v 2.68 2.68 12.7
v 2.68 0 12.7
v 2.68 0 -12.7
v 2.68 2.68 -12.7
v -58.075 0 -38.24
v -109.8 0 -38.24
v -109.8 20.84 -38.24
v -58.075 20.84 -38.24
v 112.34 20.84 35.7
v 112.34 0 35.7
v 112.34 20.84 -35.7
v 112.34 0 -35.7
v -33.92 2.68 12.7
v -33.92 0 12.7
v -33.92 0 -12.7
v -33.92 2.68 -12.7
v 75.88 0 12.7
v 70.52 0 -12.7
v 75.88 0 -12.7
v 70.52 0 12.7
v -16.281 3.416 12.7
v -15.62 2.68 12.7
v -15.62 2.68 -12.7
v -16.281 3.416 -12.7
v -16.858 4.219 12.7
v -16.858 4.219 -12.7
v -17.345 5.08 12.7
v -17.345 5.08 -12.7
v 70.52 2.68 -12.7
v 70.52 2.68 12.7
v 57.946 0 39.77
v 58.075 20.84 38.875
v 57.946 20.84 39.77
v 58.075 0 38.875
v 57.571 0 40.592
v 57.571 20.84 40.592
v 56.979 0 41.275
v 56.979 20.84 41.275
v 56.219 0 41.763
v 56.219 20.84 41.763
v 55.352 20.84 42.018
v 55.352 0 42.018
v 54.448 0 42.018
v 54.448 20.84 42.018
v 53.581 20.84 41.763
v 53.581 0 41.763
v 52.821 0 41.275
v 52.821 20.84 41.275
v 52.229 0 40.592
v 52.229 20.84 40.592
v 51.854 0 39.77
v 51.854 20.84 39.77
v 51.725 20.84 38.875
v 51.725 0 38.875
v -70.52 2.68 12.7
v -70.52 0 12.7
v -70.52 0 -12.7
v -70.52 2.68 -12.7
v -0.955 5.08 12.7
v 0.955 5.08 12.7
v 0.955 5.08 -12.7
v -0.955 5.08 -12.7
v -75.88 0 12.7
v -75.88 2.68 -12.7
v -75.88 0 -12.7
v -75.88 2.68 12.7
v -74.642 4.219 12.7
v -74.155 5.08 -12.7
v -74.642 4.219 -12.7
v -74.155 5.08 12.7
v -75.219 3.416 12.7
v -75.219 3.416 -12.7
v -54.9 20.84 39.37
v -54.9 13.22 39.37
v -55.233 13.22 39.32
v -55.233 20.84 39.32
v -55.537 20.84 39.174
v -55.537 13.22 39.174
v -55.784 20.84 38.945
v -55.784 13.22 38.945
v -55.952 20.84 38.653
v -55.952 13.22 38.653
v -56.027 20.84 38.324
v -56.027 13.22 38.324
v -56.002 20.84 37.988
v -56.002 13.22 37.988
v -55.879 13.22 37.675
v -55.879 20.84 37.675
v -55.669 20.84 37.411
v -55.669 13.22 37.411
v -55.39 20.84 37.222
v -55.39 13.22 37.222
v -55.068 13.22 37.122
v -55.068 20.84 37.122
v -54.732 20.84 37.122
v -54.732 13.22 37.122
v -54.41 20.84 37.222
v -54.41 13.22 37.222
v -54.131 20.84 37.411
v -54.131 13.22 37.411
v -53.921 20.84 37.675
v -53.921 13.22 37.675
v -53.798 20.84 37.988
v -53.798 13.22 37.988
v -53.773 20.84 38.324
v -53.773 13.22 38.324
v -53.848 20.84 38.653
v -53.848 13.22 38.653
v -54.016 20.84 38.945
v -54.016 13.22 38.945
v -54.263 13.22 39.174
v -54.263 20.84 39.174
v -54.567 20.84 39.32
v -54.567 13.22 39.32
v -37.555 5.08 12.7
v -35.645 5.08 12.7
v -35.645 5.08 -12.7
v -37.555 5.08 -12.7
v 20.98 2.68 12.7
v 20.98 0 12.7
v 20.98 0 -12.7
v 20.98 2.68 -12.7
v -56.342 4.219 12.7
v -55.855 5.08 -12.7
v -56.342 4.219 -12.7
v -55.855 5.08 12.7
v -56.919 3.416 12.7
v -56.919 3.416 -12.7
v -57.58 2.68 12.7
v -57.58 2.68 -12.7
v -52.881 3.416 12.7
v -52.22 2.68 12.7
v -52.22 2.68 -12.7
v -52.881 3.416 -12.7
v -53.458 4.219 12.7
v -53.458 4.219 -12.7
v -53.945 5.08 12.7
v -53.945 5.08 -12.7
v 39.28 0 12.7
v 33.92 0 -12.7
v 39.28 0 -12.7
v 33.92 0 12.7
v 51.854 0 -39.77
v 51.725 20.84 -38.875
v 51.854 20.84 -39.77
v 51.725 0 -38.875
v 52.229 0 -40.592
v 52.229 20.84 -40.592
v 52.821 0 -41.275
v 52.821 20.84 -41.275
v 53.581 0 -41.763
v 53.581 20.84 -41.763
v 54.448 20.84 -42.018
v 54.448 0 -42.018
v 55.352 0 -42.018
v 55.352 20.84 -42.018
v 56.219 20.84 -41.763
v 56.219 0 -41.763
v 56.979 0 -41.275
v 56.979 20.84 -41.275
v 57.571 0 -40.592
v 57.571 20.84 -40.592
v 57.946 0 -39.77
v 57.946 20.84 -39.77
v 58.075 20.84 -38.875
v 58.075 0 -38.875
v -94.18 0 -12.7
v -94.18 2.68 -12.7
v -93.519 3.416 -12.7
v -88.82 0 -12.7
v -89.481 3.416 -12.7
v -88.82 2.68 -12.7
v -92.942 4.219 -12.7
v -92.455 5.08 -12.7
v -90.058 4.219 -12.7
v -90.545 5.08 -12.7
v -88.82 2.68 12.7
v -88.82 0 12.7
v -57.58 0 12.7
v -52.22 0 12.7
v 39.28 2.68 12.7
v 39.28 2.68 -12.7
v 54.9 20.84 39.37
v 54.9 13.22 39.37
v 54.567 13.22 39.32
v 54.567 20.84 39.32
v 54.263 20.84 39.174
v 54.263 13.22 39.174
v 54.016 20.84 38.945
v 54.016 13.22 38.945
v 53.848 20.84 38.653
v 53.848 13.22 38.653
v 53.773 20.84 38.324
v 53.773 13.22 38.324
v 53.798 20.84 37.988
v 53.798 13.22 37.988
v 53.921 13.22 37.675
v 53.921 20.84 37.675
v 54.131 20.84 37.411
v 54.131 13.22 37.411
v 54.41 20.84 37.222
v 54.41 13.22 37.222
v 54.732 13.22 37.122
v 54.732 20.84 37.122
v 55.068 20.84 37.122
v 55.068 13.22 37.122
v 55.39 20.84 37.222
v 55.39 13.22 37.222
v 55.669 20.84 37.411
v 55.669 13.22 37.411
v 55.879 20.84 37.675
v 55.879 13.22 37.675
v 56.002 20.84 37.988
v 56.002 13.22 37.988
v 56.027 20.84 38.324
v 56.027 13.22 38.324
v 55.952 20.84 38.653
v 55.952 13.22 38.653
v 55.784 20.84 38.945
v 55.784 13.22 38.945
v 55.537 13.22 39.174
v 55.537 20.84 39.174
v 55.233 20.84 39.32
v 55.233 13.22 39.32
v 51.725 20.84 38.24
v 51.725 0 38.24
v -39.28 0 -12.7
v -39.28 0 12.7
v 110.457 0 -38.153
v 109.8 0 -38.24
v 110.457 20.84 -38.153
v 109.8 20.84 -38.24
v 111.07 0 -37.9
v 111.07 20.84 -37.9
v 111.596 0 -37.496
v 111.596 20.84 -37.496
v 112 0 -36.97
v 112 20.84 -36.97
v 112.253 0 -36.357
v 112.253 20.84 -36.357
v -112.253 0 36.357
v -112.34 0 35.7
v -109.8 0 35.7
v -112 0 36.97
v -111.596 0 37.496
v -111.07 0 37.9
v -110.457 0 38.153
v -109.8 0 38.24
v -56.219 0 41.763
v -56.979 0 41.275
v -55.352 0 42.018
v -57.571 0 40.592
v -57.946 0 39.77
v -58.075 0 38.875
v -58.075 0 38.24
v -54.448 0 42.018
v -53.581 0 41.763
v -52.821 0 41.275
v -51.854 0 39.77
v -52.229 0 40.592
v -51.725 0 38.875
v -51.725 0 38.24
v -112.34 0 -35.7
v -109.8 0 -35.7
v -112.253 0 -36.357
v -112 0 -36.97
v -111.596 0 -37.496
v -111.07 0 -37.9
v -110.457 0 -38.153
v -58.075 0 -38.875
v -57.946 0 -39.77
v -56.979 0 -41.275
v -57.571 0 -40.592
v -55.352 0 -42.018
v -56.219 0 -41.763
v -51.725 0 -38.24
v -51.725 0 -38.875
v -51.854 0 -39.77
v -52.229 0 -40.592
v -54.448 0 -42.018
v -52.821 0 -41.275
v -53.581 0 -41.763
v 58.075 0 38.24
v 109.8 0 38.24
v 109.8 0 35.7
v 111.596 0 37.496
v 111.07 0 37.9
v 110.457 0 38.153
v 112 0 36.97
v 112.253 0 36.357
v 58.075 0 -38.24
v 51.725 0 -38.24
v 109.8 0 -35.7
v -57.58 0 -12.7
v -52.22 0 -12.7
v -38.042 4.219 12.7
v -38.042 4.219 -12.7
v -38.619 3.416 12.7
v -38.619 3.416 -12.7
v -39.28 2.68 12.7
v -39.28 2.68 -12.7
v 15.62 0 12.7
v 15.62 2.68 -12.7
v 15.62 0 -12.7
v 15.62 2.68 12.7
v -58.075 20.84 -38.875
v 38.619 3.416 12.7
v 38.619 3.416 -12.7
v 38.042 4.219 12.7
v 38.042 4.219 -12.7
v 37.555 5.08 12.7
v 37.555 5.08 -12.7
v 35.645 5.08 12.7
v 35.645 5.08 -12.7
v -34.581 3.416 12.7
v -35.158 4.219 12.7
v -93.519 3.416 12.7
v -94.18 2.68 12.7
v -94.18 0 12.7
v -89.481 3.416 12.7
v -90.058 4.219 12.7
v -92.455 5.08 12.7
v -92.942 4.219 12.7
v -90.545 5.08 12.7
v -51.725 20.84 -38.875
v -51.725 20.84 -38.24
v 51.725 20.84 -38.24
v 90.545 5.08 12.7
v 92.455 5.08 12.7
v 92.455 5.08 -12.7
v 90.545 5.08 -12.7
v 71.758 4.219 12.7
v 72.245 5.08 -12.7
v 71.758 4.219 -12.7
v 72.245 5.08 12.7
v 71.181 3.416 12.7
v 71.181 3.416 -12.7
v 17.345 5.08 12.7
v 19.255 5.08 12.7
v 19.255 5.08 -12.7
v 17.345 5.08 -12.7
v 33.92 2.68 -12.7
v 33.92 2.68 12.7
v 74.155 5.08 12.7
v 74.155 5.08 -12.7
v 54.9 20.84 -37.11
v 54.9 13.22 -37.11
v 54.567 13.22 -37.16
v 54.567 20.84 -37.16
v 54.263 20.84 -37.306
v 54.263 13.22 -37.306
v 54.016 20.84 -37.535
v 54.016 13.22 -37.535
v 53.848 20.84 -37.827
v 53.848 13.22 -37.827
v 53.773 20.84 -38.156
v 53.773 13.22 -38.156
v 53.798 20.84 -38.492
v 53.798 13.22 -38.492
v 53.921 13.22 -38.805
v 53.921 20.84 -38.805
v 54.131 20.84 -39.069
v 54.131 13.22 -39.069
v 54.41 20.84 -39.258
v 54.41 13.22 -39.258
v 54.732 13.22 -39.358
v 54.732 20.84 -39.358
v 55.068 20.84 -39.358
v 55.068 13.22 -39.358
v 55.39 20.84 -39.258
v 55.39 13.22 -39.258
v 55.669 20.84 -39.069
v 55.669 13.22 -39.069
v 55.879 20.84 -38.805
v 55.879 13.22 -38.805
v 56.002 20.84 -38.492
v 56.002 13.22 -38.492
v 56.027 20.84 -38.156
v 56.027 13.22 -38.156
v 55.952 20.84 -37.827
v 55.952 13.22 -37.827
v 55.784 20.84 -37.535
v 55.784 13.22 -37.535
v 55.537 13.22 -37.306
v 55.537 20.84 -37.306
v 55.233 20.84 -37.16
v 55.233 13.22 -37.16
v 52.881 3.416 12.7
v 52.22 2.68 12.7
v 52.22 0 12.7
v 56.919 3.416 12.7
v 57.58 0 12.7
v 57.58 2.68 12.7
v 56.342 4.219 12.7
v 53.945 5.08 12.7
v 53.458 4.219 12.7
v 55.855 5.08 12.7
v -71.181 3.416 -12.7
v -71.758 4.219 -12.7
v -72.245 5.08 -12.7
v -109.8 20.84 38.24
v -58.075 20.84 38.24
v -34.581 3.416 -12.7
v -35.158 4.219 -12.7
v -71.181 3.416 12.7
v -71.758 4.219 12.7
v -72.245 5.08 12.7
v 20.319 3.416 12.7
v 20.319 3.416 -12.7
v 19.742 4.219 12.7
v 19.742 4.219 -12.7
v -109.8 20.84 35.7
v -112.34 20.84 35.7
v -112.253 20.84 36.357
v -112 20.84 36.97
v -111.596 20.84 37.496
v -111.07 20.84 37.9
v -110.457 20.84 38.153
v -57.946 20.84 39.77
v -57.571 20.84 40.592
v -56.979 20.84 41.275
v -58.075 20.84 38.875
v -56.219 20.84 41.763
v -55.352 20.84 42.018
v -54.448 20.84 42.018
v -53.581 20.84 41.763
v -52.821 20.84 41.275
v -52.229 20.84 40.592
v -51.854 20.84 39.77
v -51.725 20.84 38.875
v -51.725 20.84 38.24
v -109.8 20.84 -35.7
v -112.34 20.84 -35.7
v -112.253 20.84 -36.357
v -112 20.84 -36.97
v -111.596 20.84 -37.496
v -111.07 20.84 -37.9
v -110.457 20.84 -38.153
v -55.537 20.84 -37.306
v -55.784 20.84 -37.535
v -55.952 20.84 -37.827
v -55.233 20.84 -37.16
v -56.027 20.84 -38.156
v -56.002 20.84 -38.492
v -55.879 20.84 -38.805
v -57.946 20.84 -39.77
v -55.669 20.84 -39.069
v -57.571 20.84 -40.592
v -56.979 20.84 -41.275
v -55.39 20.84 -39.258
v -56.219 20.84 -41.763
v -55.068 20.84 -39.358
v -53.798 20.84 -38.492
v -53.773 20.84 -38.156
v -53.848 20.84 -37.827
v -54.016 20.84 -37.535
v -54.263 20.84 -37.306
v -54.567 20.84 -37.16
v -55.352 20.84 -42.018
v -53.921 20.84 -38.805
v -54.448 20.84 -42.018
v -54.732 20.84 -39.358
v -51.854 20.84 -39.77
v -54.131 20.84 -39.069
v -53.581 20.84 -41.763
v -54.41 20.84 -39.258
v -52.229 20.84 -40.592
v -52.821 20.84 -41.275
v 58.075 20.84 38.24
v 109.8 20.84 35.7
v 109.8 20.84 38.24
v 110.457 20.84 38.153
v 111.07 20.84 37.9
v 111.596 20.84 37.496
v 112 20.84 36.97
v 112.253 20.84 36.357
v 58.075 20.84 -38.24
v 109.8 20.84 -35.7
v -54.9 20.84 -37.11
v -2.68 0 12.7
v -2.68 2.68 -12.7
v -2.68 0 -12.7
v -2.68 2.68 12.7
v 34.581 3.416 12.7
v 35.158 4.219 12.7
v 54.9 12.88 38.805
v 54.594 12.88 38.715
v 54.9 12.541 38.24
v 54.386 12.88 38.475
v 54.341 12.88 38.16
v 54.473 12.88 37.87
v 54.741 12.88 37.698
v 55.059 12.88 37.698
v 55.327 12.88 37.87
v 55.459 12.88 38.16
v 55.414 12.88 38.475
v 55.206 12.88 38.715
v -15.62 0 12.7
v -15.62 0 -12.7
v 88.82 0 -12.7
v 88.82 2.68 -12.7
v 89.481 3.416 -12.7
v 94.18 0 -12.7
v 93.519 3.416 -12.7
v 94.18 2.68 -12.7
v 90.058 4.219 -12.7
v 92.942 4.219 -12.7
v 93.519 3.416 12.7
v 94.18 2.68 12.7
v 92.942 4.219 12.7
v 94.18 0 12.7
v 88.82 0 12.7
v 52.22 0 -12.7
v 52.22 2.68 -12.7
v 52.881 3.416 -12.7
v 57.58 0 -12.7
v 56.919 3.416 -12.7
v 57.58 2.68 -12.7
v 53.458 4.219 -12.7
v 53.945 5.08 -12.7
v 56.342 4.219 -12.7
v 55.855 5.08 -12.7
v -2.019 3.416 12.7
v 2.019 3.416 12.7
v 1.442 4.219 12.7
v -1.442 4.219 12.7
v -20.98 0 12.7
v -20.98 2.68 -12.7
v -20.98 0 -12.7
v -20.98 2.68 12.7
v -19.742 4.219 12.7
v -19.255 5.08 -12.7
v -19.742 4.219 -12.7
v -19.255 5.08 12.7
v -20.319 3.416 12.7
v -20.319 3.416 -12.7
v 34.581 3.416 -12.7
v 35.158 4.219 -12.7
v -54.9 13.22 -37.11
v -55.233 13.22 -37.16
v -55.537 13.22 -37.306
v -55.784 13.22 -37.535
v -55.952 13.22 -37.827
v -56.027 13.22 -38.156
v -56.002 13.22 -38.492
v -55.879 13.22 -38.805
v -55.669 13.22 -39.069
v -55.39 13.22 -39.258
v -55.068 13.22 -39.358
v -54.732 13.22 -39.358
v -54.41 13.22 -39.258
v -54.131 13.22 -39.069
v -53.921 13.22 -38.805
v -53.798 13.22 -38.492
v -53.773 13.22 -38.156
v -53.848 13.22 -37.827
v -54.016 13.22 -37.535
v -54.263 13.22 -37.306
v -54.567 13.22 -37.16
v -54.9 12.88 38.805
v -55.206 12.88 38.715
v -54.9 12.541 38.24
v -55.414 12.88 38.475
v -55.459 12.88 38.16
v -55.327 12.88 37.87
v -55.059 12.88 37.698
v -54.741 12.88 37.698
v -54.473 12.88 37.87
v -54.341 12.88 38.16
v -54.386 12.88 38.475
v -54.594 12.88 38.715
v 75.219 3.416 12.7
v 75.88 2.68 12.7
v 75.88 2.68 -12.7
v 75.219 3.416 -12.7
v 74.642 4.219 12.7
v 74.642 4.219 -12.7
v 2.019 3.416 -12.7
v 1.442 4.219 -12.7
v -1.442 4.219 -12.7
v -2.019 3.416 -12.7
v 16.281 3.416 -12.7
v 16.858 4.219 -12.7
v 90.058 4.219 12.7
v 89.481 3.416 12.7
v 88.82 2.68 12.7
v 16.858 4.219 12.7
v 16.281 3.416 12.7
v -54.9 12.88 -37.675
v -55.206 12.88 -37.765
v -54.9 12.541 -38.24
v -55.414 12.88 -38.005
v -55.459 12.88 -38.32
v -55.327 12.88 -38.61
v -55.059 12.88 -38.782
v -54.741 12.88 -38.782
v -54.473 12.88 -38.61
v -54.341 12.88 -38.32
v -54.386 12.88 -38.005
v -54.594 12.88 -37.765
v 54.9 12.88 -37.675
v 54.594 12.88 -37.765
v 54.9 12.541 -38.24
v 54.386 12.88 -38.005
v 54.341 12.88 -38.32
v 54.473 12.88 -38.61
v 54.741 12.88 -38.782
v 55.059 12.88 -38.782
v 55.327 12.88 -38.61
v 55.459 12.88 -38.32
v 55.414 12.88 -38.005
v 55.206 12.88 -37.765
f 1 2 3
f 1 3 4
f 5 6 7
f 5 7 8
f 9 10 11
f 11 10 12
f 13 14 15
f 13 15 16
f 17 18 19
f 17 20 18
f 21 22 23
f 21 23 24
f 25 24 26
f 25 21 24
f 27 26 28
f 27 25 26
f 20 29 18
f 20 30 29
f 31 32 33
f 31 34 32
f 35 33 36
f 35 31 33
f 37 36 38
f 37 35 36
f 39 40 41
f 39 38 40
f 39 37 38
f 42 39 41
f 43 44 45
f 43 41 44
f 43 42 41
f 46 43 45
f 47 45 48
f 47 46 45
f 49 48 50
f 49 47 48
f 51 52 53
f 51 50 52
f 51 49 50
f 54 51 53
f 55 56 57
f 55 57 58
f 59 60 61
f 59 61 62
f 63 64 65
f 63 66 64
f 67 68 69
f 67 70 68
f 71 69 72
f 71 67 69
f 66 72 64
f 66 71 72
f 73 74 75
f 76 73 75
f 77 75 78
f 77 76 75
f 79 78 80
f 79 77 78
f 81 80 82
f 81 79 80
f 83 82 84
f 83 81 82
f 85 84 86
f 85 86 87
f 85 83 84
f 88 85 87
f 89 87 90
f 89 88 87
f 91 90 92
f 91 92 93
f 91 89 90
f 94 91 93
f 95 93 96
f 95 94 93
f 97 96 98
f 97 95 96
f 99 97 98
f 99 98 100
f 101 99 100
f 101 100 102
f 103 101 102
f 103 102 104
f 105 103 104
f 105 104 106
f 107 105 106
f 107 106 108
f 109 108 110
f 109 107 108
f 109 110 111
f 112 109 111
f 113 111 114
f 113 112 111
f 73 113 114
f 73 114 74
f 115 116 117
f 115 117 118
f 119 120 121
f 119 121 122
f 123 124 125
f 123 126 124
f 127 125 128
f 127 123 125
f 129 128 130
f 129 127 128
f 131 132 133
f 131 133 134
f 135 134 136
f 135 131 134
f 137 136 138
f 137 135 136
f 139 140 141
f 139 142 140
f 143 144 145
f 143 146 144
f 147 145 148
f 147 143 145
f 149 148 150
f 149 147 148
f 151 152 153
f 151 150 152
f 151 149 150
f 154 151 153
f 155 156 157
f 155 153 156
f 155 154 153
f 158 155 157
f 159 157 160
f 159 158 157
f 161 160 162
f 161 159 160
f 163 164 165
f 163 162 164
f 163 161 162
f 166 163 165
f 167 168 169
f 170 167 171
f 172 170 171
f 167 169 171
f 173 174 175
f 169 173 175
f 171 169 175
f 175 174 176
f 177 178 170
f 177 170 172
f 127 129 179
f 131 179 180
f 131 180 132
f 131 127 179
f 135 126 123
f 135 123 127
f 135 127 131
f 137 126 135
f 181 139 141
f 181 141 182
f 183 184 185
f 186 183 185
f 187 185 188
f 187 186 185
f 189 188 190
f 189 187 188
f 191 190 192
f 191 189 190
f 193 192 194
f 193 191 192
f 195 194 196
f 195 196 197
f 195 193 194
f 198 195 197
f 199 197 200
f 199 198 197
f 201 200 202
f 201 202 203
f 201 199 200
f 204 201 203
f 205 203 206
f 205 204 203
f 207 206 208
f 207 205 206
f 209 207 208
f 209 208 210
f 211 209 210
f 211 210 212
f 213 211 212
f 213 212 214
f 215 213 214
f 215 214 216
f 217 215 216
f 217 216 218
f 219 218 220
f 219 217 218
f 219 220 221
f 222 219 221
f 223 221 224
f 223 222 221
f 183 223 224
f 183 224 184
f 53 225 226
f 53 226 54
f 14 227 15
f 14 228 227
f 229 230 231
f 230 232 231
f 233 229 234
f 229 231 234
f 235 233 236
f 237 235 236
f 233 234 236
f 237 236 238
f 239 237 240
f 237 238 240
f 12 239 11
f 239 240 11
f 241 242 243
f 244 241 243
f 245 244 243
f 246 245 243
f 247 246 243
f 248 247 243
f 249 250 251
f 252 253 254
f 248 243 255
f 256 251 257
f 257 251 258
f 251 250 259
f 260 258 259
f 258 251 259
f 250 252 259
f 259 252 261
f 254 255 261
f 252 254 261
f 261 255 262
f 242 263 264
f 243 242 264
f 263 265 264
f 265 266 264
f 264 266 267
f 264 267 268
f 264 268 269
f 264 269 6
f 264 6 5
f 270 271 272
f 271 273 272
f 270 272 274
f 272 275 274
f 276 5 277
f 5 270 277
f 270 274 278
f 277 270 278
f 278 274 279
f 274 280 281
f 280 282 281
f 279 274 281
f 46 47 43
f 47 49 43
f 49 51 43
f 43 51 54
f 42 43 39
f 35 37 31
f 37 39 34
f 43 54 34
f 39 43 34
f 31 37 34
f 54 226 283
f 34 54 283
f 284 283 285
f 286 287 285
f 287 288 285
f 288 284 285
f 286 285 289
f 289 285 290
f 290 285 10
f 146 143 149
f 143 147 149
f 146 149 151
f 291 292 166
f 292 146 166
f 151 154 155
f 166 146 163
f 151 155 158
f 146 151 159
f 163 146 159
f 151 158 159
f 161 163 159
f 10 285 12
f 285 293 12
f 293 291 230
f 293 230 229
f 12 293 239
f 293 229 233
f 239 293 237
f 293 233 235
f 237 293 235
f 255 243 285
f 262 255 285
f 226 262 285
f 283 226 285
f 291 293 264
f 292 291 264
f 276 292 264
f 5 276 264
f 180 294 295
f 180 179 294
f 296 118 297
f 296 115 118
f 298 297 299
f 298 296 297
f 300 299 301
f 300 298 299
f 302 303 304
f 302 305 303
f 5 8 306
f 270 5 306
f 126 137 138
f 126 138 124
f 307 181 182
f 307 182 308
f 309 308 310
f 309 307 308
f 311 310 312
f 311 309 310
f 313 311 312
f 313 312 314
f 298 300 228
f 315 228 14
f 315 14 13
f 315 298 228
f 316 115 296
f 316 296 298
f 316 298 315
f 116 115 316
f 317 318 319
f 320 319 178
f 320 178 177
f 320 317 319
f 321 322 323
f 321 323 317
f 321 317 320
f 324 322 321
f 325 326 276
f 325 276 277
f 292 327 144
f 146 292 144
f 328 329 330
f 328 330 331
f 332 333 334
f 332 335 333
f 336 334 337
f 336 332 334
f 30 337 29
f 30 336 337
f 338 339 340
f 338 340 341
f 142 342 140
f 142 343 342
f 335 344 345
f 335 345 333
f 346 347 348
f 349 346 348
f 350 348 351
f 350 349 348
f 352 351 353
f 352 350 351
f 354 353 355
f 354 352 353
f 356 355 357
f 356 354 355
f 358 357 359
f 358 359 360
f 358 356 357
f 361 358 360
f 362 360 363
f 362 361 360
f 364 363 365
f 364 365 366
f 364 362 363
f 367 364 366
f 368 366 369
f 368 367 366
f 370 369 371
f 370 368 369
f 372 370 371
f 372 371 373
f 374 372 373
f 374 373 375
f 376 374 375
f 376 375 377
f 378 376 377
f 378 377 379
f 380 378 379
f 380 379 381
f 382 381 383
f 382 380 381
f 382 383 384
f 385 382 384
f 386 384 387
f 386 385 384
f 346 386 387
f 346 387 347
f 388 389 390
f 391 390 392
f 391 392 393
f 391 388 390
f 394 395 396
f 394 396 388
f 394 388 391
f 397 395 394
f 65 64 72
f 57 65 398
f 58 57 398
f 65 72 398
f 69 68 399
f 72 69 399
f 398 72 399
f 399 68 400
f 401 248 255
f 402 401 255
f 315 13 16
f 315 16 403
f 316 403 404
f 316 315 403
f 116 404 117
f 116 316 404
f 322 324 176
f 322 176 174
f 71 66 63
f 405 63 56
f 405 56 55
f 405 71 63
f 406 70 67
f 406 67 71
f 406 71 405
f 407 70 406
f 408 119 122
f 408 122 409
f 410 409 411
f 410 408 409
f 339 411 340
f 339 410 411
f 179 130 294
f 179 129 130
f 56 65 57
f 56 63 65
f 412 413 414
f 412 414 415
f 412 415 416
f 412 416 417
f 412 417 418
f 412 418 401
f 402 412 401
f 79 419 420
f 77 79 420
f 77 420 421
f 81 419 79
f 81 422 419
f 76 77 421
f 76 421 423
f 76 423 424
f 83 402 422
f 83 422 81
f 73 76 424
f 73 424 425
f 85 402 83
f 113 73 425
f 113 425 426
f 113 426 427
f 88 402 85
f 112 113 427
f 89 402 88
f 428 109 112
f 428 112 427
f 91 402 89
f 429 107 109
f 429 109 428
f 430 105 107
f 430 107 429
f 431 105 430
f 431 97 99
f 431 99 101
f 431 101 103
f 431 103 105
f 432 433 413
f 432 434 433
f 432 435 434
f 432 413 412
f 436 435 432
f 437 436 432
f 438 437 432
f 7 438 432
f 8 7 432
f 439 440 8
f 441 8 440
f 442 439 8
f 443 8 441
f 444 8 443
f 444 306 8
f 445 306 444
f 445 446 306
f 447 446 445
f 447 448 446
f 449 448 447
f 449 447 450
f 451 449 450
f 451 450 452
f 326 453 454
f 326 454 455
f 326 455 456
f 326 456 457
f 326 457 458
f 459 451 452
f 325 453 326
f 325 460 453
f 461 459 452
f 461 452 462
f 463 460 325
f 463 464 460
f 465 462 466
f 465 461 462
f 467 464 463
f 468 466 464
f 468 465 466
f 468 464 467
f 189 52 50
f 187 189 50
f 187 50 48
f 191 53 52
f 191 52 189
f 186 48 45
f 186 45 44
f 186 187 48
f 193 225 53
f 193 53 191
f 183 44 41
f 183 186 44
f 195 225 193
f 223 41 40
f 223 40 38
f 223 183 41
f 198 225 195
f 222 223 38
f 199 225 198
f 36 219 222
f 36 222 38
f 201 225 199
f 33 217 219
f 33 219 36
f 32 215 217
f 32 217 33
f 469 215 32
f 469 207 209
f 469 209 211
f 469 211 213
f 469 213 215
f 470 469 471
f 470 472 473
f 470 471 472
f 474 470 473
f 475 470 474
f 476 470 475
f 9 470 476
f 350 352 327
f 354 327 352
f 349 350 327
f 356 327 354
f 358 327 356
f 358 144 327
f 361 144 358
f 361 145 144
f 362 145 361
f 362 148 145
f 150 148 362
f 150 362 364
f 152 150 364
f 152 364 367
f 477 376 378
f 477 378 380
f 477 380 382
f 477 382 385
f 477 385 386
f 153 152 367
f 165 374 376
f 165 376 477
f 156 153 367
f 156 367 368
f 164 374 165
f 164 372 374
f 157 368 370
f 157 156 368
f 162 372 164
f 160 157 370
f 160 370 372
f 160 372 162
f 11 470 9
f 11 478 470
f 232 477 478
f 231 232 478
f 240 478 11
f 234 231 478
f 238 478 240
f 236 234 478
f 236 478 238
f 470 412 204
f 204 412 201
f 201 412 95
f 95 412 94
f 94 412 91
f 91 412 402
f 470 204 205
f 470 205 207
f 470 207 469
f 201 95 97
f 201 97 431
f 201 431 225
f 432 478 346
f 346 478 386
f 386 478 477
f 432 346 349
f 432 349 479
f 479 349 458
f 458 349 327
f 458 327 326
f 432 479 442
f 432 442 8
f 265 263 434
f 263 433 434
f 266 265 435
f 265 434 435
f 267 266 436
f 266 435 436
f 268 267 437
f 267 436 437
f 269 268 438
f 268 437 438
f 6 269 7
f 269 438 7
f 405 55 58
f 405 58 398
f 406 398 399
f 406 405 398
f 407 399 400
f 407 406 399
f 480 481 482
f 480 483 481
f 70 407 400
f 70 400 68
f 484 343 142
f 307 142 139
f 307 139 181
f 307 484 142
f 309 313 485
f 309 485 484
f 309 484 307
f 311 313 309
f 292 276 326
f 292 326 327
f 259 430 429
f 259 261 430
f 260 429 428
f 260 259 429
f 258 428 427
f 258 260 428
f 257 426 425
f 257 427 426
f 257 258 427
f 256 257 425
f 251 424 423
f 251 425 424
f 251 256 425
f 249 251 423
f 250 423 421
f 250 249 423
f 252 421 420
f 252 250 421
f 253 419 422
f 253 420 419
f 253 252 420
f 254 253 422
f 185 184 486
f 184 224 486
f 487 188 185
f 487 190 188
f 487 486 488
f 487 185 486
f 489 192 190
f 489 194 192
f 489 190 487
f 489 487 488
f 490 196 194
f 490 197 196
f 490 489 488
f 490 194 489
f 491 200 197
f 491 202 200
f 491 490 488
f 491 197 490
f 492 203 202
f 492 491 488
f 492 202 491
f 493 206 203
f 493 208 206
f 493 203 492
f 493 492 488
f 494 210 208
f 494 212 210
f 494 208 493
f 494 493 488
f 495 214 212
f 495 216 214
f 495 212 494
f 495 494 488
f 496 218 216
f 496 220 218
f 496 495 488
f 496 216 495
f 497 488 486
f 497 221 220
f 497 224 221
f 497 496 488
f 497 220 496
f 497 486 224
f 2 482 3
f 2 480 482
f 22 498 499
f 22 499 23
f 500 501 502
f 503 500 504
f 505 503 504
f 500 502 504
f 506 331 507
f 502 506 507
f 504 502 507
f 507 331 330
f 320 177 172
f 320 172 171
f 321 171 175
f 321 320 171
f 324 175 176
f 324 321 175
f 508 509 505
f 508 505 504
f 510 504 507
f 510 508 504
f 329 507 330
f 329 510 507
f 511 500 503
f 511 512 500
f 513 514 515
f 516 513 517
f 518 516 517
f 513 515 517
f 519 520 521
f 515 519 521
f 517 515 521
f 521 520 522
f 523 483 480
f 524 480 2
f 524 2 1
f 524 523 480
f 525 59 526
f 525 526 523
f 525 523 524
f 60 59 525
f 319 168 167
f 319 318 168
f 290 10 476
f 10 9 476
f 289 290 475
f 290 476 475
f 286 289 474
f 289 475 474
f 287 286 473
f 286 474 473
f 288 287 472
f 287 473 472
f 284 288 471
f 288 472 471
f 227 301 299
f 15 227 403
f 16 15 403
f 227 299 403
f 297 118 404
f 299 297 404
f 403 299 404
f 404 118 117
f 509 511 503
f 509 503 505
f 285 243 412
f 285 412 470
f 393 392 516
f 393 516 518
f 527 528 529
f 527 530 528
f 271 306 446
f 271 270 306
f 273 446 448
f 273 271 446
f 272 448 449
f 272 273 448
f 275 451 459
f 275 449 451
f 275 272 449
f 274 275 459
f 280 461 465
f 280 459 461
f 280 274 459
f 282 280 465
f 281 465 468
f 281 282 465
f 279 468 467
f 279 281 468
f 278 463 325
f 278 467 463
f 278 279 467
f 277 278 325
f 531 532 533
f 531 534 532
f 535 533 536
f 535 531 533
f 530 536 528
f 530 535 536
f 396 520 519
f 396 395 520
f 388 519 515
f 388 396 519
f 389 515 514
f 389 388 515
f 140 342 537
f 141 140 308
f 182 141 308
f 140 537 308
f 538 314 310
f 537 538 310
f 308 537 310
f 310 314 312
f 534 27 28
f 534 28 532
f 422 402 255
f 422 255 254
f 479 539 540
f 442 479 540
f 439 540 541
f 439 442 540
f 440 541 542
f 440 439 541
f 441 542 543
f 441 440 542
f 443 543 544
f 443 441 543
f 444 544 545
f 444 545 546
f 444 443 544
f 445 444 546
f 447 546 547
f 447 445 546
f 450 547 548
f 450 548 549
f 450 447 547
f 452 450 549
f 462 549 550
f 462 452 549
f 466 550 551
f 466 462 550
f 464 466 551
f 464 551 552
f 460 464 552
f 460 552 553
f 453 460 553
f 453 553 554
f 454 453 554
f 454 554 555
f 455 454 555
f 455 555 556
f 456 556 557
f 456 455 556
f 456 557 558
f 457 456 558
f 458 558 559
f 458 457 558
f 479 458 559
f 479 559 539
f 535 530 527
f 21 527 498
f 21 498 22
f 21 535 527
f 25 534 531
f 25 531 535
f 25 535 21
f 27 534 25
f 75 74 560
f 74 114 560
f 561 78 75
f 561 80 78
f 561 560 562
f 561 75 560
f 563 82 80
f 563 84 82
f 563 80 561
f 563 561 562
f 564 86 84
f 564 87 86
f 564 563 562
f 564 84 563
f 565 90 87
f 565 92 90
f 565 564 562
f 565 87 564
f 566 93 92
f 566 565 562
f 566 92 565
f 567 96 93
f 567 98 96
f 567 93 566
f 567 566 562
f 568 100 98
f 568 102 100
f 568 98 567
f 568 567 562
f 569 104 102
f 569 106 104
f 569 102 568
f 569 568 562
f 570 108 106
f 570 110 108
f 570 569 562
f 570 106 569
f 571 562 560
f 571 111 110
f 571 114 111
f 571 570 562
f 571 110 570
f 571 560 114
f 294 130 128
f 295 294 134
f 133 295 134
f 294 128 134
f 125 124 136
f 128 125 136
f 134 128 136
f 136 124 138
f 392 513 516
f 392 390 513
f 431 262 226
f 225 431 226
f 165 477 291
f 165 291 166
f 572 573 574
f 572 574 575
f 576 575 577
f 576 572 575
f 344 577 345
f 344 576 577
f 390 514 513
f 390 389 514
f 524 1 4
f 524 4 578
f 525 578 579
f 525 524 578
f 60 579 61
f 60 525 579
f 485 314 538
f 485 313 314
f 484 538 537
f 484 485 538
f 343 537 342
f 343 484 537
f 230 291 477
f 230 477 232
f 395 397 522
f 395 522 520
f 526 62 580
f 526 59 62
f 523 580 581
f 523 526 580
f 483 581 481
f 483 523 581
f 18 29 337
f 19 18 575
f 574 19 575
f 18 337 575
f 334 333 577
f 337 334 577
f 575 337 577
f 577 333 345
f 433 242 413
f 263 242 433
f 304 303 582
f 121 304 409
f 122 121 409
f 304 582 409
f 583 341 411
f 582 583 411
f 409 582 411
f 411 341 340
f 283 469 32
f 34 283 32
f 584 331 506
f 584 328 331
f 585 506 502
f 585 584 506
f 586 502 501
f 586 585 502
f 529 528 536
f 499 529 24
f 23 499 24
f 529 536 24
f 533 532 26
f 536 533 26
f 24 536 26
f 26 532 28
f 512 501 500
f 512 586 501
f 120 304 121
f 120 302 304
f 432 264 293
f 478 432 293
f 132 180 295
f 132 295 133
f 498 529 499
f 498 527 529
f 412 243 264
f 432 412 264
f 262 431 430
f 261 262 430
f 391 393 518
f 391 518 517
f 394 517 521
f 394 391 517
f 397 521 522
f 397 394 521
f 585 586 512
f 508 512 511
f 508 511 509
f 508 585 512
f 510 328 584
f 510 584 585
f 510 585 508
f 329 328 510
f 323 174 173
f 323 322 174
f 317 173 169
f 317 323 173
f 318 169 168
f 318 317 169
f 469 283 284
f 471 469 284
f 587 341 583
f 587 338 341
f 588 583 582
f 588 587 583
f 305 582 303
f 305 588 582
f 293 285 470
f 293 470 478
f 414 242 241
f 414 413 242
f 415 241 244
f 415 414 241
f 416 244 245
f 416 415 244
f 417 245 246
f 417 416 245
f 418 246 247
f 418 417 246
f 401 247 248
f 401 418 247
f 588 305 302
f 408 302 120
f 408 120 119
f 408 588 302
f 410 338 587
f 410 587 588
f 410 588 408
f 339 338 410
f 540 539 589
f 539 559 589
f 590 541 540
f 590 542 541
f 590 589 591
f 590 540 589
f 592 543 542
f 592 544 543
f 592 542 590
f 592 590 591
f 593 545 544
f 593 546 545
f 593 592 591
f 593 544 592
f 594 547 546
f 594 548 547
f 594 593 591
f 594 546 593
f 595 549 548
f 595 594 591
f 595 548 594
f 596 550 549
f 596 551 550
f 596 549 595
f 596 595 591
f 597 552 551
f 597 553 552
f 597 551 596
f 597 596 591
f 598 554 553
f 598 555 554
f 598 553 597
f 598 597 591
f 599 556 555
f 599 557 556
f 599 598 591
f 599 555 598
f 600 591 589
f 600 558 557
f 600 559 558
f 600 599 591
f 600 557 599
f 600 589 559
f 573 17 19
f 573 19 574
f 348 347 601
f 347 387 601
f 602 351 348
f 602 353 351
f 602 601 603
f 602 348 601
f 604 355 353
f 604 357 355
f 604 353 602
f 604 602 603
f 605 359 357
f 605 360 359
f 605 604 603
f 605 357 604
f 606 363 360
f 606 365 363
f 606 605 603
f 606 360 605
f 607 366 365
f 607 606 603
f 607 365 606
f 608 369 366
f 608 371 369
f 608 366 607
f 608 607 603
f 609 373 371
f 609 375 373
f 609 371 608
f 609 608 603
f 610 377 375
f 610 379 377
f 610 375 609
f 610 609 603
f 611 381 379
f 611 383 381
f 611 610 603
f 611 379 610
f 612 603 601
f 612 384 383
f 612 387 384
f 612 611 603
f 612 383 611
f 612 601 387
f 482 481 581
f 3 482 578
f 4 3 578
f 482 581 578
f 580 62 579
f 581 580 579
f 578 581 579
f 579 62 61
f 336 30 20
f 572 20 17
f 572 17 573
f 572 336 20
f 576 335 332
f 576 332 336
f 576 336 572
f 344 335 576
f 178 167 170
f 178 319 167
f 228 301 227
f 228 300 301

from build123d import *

# Parameters (mm, degrees)
BOSS_EXTRUDE1_OUTLINE_W        = 224.68
BOSS_EXTRUDE1_OUTLINE_H        = 76.48
BOSS_EXTRUDE1_OUTLINE_W_2      = 219.6
BOSS_EXTRUDE1_OUTLINE_H_2      = 71.4
BOSS_EXTRUDE1_DEPTH            = 20.839999976
BOSS_EXTRUDE2_DEPTH            = 12.7
LPATTERN2_COUNT                = 11
LPATTERN2_PITCH                = 18.3
SKETCH6_W                      = 6.35
SKETCH6_H                      = 3.81
BOSS_EXTRUDE3_DEPTH            = 20.839999976
MIRROR2_COPY_1_SKETCH_W        = 6.35
MIRROR2_COPY_1_SKETCH_H        = 3.81
MIRROR2_COPY_1_DEPTH           = 20.839999976
F_4_40_TAPPED_HOLE1_AT_2_COUNT = 2
F_4_40_TAPPED_HOLE1_AT_2_PITCH = 109.8
F_4_40_TAPPED_HOLE1_AT_3_COUNT = 2
F_4_40_TAPPED_HOLE1_AT_3_PITCH = 133.810427097
F_4_40_TAPPED_HOLE1_AT_4_COUNT = 2
F_4_40_TAPPED_HOLE1_AT_4_PITCH = 76.48
FILLET1_RADIUS                 = 3.175
FILLET1_LENGTH                 = 20.839999976
FILLET2_RADIUS                 = 3.175
FILLET2_LENGTH                 = 20.839999976
FILLET3_RADIUS                 = 3.175
FILLET3_LENGTH                 = 20.839999976
FILLET4_RADIUS                 = 3.175
FILLET4_LENGTH                 = 20.839999976
FILLET5_R                      = 2.54


# Read off the part's stored shape, not the designer's step: Boss-Extrude1
with BuildPart() as part:
    # Boss-Extrude1 outline → Boss-Extrude1 (new body)
    with BuildSketch(Plane(origin=(0, 0, 0), x_dir=(1, 0, 0), z_dir=(0, 1, 0))):
        Rectangle(BOSS_EXTRUDE1_OUTLINE_W, BOSS_EXTRUDE1_OUTLINE_H)
        Rectangle(BOSS_EXTRUDE1_OUTLINE_W_2, BOSS_EXTRUDE1_OUTLINE_H_2, mode=Mode.SUBTRACT)
    extrude(amount=BOSS_EXTRUDE1_DEPTH)

    # Sketch6 → Boss-Extrude3 (add)
    with BuildSketch(Plane(origin=(0, 20.839999976, 0), x_dir=(1, 0, 0), z_dir=(0, 1, 0))):
        with Locations((-54.9, 40.145)):
            Rectangle(SKETCH6_W, SKETCH6_H)
    boss_extrude3 = extrude(amount=-BOSS_EXTRUDE3_DEPTH)

    # Mirror1: Boss-Extrude3 across plane
    add(boss_extrude3.mirror(Plane(origin=(0, 0, 0), x_dir=(0, 0, 1), z_dir=(1, 0, 0))))

    # Mirror2: Boss-Extrude3 across plane
    add(boss_extrude3.mirror(Plane.XY))

    # Mirror2 copy 1 sketch → Mirror2 copy 1 (add)
    with BuildSketch(Plane(origin=(0, 20.839999976, 0), x_dir=(-1, 0, 0), z_dir=(0, 1, 0))):
        with Locations((-54.9, 40.145)):
            Rectangle(MIRROR2_COPY_1_SKETCH_W, MIRROR2_COPY_1_SKETCH_H)
    extrude(amount=-MIRROR2_COPY_1_DEPTH)

    # Sketch7 → #4-40 Tapped Hole1 (revolve, cut)
    with BuildSketch(Plane(origin=(-54.9, 20.839999976, -38.24), x_dir=(0, 0, 1), z_dir=(1, 0, 0))):
        Polygon((0, 0), (0, 8.299152758), (1.1303, 7.62), (1.1303, 0), align=None)
    f_4_40_tapped_hole1 = revolve(axis=Axis((-54.9, 27.189999976, -38.24), (0, -1, 0)), mode=Mode.SUBTRACT)

    # #4-40 Tapped Hole1 at 2: #4-40 Tapped Hole1 ×2
    with Locations(*[(i * F_4_40_TAPPED_HOLE1_AT_2_PITCH, 0, 0) for i in range(1, F_4_40_TAPPED_HOLE1_AT_2_COUNT)]):
        add(f_4_40_tapped_hole1, mode=Mode.SUBTRACT)

    # #4-40 Tapped Hole1 at 3: #4-40 Tapped Hole1 ×2
    with Locations(*[Vector(0.8205638557602251, 0, 0.5715548605513844) * (i * F_4_40_TAPPED_HOLE1_AT_3_PITCH) for i in range(1, F_4_40_TAPPED_HOLE1_AT_3_COUNT)]):
        add(f_4_40_tapped_hole1, mode=Mode.SUBTRACT)

    # #4-40 Tapped Hole1 at 4: #4-40 Tapped Hole1 ×2
    with Locations(*[(0, 0, i * F_4_40_TAPPED_HOLE1_AT_4_PITCH) for i in range(1, F_4_40_TAPPED_HOLE1_AT_4_COUNT)]):
        add(f_4_40_tapped_hole1, mode=Mode.SUBTRACT)

    # Fillet1: full round fillet: the end face becomes a half cylinder, R = half its width
    fillet1_face = Plane((-54.9, 10.419999988, -42.05), x_dir=(0, -1, 0), z_dir=(0, 0, -1))  # on the end face: x along it, z out of the body
    fillet1_slab = fillet1_face.offset(-FILLET1_RADIUS / 2) * Box(FILLET1_LENGTH, 2 * FILLET1_RADIUS, FILLET1_RADIUS, mode=Mode.PRIVATE)  # the body's end, R deep
    fillet1_round = Plane((-54.9, 10.419999988, -38.875), x_dir=(0, 0, -1), z_dir=(0, -1, 0)) * Cylinder(FILLET1_RADIUS, FILLET1_LENGTH, mode=Mode.PRIVATE)  # its axis R under the face
    add(fillet1_slab - fillet1_round, mode=Mode.SUBTRACT)

    # Fillet2: full round fillet: the end face becomes a half cylinder, R = half its width
    fillet2_face = Plane((54.9, 10.419999988, -42.05), x_dir=(0, -1, 0), z_dir=(0, 0, -1))  # on the end face: x along it, z out of the body
    fillet2_slab = fillet2_face.offset(-FILLET2_RADIUS / 2) * Box(FILLET2_LENGTH, 2 * FILLET2_RADIUS, FILLET2_RADIUS, mode=Mode.PRIVATE)  # the body's end, R deep
    fillet2_round = Plane((54.9, 10.419999988, -38.875), x_dir=(0, 0, -1), z_dir=(0, -1, 0)) * Cylinder(FILLET2_RADIUS, FILLET2_LENGTH, mode=Mode.PRIVATE)  # its axis R under the face
    add(fillet2_slab - fillet2_round, mode=Mode.SUBTRACT)

    # Fillet3: full round fillet: the end face becomes a half cylinder, R = half its width
    fillet3_face = Plane((54.9, 10.419999988, 42.05), x_dir=(0, -1, 0), z_dir=(0, 0, 1))  # on the end face: x along it, z out of the body
    fillet3_slab = fillet3_face.offset(-FILLET3_RADIUS / 2) * Box(FILLET3_LENGTH, 2 * FILLET3_RADIUS, FILLET3_RADIUS, mode=Mode.PRIVATE)  # the body's end, R deep
    fillet3_round = Plane((54.9, 10.419999988, 38.875), x_dir=(0, 0, 1), z_dir=(0, -1, 0)) * Cylinder(FILLET3_RADIUS, FILLET3_LENGTH, mode=Mode.PRIVATE)  # its axis R under the face
    add(fillet3_slab - fillet3_round, mode=Mode.SUBTRACT)

    # Fillet4: full round fillet: the end face becomes a half cylinder, R = half its width
    fillet4_face = Plane((-54.9, 10.419999988, 42.05), x_dir=(0, -1, 0), z_dir=(0, 0, 1))  # on the end face: x along it, z out of the body
    fillet4_slab = fillet4_face.offset(-FILLET4_RADIUS / 2) * Box(FILLET4_LENGTH, 2 * FILLET4_RADIUS, FILLET4_RADIUS, mode=Mode.PRIVATE)  # the body's end, R deep
    fillet4_round = Plane((-54.9, 10.419999988, 38.875), x_dir=(0, 0, 1), z_dir=(0, -1, 0)) * Cylinder(FILLET4_RADIUS, FILLET4_LENGTH, mode=Mode.PRIVATE)  # its axis R under the face
    add(fillet4_slab - fillet4_round, mode=Mode.SUBTRACT)

    # Fillet5
    fillet5_edges = [part.edges().sort_by_distance(p)[0] for p in [
        (112.34, 10.419999988, 38.24),
        (112.34, 10.419999988, -38.24),
        (-112.34, 10.419999988, -38.24),
        (-112.34, 10.419999988, 38.24),
    ]]
    fillet(fillet5_edges, radius=FILLET5_R)


with BuildPart() as body_2:
    # Sketch4 → Boss-Extrude2 (new, symmetric)
    with BuildSketch(Plane.XY):
        with BuildLine():
            Line((-94.179972952, 0), (-88.820027048, 0))
            Line((-88.820027048, 0), (-88.820027048, 2.679972952))
            ThreePointArc((-88.820027048, 2.679972952), (-89.780046898, 3.809877988), (-90.54497407, 5.08))
            Line((-90.54497407, 5.08), (-92.45502593, 5.08))
            ThreePointArc((-92.45502593, 5.08), (-93.219953102, 3.809877988), (-94.179972952, 2.679972952))
            Line((-94.179972952, 2.679972952), (-94.179972952, 0))
        make_face()
    extrude(amount=BOSS_EXTRUDE2_DEPTH, both=True)


with BuildPart() as lpattern2_1:
    # LPattern2: pattern copy
    add(body_2.part.moved(Location(Vector(1, 0, 0) * (1 * LPATTERN2_PITCH))))


with BuildPart() as lpattern2_2:
    # LPattern2: pattern copy
    add(body_2.part.moved(Location(Vector(1, 0, 0) * (2 * LPATTERN2_PITCH))))


with BuildPart() as lpattern2_3:
    # LPattern2: pattern copy
    add(body_2.part.moved(Location(Vector(1, 0, 0) * (3 * LPATTERN2_PITCH))))


with BuildPart() as lpattern2_4:
    # LPattern2: pattern copy
    add(body_2.part.moved(Location(Vector(1, 0, 0) * (4 * LPATTERN2_PITCH))))


with BuildPart() as lpattern2_5:
    # LPattern2: pattern copy
    add(body_2.part.moved(Location(Vector(1, 0, 0) * (5 * LPATTERN2_PITCH))))


with BuildPart() as lpattern2_6:
    # LPattern2: pattern copy
    add(body_2.part.moved(Location(Vector(1, 0, 0) * (6 * LPATTERN2_PITCH))))


with BuildPart() as lpattern2_7:
    # LPattern2: pattern copy
    add(body_2.part.moved(Location(Vector(1, 0, 0) * (7 * LPATTERN2_PITCH))))


with BuildPart() as lpattern2_8:
    # LPattern2: pattern copy
    add(body_2.part.moved(Location(Vector(1, 0, 0) * (8 * LPATTERN2_PITCH))))


with BuildPart() as lpattern2_9:
    # LPattern2: pattern copy
    add(body_2.part.moved(Location(Vector(1, 0, 0) * (9 * LPATTERN2_PITCH))))


with BuildPart() as lpattern2_10:
    # LPattern2: pattern copy
    add(body_2.part.moved(Location(Vector(1, 0, 0) * (10 * LPATTERN2_PITCH))))


solid = Compound([part.part, body_2.part, lpattern2_1.part, lpattern2_2.part, lpattern2_3.part, lpattern2_4.part, lpattern2_5.part, lpattern2_6.part, lpattern2_7.part, lpattern2_8.part, lpattern2_9.part, lpattern2_10.part])
